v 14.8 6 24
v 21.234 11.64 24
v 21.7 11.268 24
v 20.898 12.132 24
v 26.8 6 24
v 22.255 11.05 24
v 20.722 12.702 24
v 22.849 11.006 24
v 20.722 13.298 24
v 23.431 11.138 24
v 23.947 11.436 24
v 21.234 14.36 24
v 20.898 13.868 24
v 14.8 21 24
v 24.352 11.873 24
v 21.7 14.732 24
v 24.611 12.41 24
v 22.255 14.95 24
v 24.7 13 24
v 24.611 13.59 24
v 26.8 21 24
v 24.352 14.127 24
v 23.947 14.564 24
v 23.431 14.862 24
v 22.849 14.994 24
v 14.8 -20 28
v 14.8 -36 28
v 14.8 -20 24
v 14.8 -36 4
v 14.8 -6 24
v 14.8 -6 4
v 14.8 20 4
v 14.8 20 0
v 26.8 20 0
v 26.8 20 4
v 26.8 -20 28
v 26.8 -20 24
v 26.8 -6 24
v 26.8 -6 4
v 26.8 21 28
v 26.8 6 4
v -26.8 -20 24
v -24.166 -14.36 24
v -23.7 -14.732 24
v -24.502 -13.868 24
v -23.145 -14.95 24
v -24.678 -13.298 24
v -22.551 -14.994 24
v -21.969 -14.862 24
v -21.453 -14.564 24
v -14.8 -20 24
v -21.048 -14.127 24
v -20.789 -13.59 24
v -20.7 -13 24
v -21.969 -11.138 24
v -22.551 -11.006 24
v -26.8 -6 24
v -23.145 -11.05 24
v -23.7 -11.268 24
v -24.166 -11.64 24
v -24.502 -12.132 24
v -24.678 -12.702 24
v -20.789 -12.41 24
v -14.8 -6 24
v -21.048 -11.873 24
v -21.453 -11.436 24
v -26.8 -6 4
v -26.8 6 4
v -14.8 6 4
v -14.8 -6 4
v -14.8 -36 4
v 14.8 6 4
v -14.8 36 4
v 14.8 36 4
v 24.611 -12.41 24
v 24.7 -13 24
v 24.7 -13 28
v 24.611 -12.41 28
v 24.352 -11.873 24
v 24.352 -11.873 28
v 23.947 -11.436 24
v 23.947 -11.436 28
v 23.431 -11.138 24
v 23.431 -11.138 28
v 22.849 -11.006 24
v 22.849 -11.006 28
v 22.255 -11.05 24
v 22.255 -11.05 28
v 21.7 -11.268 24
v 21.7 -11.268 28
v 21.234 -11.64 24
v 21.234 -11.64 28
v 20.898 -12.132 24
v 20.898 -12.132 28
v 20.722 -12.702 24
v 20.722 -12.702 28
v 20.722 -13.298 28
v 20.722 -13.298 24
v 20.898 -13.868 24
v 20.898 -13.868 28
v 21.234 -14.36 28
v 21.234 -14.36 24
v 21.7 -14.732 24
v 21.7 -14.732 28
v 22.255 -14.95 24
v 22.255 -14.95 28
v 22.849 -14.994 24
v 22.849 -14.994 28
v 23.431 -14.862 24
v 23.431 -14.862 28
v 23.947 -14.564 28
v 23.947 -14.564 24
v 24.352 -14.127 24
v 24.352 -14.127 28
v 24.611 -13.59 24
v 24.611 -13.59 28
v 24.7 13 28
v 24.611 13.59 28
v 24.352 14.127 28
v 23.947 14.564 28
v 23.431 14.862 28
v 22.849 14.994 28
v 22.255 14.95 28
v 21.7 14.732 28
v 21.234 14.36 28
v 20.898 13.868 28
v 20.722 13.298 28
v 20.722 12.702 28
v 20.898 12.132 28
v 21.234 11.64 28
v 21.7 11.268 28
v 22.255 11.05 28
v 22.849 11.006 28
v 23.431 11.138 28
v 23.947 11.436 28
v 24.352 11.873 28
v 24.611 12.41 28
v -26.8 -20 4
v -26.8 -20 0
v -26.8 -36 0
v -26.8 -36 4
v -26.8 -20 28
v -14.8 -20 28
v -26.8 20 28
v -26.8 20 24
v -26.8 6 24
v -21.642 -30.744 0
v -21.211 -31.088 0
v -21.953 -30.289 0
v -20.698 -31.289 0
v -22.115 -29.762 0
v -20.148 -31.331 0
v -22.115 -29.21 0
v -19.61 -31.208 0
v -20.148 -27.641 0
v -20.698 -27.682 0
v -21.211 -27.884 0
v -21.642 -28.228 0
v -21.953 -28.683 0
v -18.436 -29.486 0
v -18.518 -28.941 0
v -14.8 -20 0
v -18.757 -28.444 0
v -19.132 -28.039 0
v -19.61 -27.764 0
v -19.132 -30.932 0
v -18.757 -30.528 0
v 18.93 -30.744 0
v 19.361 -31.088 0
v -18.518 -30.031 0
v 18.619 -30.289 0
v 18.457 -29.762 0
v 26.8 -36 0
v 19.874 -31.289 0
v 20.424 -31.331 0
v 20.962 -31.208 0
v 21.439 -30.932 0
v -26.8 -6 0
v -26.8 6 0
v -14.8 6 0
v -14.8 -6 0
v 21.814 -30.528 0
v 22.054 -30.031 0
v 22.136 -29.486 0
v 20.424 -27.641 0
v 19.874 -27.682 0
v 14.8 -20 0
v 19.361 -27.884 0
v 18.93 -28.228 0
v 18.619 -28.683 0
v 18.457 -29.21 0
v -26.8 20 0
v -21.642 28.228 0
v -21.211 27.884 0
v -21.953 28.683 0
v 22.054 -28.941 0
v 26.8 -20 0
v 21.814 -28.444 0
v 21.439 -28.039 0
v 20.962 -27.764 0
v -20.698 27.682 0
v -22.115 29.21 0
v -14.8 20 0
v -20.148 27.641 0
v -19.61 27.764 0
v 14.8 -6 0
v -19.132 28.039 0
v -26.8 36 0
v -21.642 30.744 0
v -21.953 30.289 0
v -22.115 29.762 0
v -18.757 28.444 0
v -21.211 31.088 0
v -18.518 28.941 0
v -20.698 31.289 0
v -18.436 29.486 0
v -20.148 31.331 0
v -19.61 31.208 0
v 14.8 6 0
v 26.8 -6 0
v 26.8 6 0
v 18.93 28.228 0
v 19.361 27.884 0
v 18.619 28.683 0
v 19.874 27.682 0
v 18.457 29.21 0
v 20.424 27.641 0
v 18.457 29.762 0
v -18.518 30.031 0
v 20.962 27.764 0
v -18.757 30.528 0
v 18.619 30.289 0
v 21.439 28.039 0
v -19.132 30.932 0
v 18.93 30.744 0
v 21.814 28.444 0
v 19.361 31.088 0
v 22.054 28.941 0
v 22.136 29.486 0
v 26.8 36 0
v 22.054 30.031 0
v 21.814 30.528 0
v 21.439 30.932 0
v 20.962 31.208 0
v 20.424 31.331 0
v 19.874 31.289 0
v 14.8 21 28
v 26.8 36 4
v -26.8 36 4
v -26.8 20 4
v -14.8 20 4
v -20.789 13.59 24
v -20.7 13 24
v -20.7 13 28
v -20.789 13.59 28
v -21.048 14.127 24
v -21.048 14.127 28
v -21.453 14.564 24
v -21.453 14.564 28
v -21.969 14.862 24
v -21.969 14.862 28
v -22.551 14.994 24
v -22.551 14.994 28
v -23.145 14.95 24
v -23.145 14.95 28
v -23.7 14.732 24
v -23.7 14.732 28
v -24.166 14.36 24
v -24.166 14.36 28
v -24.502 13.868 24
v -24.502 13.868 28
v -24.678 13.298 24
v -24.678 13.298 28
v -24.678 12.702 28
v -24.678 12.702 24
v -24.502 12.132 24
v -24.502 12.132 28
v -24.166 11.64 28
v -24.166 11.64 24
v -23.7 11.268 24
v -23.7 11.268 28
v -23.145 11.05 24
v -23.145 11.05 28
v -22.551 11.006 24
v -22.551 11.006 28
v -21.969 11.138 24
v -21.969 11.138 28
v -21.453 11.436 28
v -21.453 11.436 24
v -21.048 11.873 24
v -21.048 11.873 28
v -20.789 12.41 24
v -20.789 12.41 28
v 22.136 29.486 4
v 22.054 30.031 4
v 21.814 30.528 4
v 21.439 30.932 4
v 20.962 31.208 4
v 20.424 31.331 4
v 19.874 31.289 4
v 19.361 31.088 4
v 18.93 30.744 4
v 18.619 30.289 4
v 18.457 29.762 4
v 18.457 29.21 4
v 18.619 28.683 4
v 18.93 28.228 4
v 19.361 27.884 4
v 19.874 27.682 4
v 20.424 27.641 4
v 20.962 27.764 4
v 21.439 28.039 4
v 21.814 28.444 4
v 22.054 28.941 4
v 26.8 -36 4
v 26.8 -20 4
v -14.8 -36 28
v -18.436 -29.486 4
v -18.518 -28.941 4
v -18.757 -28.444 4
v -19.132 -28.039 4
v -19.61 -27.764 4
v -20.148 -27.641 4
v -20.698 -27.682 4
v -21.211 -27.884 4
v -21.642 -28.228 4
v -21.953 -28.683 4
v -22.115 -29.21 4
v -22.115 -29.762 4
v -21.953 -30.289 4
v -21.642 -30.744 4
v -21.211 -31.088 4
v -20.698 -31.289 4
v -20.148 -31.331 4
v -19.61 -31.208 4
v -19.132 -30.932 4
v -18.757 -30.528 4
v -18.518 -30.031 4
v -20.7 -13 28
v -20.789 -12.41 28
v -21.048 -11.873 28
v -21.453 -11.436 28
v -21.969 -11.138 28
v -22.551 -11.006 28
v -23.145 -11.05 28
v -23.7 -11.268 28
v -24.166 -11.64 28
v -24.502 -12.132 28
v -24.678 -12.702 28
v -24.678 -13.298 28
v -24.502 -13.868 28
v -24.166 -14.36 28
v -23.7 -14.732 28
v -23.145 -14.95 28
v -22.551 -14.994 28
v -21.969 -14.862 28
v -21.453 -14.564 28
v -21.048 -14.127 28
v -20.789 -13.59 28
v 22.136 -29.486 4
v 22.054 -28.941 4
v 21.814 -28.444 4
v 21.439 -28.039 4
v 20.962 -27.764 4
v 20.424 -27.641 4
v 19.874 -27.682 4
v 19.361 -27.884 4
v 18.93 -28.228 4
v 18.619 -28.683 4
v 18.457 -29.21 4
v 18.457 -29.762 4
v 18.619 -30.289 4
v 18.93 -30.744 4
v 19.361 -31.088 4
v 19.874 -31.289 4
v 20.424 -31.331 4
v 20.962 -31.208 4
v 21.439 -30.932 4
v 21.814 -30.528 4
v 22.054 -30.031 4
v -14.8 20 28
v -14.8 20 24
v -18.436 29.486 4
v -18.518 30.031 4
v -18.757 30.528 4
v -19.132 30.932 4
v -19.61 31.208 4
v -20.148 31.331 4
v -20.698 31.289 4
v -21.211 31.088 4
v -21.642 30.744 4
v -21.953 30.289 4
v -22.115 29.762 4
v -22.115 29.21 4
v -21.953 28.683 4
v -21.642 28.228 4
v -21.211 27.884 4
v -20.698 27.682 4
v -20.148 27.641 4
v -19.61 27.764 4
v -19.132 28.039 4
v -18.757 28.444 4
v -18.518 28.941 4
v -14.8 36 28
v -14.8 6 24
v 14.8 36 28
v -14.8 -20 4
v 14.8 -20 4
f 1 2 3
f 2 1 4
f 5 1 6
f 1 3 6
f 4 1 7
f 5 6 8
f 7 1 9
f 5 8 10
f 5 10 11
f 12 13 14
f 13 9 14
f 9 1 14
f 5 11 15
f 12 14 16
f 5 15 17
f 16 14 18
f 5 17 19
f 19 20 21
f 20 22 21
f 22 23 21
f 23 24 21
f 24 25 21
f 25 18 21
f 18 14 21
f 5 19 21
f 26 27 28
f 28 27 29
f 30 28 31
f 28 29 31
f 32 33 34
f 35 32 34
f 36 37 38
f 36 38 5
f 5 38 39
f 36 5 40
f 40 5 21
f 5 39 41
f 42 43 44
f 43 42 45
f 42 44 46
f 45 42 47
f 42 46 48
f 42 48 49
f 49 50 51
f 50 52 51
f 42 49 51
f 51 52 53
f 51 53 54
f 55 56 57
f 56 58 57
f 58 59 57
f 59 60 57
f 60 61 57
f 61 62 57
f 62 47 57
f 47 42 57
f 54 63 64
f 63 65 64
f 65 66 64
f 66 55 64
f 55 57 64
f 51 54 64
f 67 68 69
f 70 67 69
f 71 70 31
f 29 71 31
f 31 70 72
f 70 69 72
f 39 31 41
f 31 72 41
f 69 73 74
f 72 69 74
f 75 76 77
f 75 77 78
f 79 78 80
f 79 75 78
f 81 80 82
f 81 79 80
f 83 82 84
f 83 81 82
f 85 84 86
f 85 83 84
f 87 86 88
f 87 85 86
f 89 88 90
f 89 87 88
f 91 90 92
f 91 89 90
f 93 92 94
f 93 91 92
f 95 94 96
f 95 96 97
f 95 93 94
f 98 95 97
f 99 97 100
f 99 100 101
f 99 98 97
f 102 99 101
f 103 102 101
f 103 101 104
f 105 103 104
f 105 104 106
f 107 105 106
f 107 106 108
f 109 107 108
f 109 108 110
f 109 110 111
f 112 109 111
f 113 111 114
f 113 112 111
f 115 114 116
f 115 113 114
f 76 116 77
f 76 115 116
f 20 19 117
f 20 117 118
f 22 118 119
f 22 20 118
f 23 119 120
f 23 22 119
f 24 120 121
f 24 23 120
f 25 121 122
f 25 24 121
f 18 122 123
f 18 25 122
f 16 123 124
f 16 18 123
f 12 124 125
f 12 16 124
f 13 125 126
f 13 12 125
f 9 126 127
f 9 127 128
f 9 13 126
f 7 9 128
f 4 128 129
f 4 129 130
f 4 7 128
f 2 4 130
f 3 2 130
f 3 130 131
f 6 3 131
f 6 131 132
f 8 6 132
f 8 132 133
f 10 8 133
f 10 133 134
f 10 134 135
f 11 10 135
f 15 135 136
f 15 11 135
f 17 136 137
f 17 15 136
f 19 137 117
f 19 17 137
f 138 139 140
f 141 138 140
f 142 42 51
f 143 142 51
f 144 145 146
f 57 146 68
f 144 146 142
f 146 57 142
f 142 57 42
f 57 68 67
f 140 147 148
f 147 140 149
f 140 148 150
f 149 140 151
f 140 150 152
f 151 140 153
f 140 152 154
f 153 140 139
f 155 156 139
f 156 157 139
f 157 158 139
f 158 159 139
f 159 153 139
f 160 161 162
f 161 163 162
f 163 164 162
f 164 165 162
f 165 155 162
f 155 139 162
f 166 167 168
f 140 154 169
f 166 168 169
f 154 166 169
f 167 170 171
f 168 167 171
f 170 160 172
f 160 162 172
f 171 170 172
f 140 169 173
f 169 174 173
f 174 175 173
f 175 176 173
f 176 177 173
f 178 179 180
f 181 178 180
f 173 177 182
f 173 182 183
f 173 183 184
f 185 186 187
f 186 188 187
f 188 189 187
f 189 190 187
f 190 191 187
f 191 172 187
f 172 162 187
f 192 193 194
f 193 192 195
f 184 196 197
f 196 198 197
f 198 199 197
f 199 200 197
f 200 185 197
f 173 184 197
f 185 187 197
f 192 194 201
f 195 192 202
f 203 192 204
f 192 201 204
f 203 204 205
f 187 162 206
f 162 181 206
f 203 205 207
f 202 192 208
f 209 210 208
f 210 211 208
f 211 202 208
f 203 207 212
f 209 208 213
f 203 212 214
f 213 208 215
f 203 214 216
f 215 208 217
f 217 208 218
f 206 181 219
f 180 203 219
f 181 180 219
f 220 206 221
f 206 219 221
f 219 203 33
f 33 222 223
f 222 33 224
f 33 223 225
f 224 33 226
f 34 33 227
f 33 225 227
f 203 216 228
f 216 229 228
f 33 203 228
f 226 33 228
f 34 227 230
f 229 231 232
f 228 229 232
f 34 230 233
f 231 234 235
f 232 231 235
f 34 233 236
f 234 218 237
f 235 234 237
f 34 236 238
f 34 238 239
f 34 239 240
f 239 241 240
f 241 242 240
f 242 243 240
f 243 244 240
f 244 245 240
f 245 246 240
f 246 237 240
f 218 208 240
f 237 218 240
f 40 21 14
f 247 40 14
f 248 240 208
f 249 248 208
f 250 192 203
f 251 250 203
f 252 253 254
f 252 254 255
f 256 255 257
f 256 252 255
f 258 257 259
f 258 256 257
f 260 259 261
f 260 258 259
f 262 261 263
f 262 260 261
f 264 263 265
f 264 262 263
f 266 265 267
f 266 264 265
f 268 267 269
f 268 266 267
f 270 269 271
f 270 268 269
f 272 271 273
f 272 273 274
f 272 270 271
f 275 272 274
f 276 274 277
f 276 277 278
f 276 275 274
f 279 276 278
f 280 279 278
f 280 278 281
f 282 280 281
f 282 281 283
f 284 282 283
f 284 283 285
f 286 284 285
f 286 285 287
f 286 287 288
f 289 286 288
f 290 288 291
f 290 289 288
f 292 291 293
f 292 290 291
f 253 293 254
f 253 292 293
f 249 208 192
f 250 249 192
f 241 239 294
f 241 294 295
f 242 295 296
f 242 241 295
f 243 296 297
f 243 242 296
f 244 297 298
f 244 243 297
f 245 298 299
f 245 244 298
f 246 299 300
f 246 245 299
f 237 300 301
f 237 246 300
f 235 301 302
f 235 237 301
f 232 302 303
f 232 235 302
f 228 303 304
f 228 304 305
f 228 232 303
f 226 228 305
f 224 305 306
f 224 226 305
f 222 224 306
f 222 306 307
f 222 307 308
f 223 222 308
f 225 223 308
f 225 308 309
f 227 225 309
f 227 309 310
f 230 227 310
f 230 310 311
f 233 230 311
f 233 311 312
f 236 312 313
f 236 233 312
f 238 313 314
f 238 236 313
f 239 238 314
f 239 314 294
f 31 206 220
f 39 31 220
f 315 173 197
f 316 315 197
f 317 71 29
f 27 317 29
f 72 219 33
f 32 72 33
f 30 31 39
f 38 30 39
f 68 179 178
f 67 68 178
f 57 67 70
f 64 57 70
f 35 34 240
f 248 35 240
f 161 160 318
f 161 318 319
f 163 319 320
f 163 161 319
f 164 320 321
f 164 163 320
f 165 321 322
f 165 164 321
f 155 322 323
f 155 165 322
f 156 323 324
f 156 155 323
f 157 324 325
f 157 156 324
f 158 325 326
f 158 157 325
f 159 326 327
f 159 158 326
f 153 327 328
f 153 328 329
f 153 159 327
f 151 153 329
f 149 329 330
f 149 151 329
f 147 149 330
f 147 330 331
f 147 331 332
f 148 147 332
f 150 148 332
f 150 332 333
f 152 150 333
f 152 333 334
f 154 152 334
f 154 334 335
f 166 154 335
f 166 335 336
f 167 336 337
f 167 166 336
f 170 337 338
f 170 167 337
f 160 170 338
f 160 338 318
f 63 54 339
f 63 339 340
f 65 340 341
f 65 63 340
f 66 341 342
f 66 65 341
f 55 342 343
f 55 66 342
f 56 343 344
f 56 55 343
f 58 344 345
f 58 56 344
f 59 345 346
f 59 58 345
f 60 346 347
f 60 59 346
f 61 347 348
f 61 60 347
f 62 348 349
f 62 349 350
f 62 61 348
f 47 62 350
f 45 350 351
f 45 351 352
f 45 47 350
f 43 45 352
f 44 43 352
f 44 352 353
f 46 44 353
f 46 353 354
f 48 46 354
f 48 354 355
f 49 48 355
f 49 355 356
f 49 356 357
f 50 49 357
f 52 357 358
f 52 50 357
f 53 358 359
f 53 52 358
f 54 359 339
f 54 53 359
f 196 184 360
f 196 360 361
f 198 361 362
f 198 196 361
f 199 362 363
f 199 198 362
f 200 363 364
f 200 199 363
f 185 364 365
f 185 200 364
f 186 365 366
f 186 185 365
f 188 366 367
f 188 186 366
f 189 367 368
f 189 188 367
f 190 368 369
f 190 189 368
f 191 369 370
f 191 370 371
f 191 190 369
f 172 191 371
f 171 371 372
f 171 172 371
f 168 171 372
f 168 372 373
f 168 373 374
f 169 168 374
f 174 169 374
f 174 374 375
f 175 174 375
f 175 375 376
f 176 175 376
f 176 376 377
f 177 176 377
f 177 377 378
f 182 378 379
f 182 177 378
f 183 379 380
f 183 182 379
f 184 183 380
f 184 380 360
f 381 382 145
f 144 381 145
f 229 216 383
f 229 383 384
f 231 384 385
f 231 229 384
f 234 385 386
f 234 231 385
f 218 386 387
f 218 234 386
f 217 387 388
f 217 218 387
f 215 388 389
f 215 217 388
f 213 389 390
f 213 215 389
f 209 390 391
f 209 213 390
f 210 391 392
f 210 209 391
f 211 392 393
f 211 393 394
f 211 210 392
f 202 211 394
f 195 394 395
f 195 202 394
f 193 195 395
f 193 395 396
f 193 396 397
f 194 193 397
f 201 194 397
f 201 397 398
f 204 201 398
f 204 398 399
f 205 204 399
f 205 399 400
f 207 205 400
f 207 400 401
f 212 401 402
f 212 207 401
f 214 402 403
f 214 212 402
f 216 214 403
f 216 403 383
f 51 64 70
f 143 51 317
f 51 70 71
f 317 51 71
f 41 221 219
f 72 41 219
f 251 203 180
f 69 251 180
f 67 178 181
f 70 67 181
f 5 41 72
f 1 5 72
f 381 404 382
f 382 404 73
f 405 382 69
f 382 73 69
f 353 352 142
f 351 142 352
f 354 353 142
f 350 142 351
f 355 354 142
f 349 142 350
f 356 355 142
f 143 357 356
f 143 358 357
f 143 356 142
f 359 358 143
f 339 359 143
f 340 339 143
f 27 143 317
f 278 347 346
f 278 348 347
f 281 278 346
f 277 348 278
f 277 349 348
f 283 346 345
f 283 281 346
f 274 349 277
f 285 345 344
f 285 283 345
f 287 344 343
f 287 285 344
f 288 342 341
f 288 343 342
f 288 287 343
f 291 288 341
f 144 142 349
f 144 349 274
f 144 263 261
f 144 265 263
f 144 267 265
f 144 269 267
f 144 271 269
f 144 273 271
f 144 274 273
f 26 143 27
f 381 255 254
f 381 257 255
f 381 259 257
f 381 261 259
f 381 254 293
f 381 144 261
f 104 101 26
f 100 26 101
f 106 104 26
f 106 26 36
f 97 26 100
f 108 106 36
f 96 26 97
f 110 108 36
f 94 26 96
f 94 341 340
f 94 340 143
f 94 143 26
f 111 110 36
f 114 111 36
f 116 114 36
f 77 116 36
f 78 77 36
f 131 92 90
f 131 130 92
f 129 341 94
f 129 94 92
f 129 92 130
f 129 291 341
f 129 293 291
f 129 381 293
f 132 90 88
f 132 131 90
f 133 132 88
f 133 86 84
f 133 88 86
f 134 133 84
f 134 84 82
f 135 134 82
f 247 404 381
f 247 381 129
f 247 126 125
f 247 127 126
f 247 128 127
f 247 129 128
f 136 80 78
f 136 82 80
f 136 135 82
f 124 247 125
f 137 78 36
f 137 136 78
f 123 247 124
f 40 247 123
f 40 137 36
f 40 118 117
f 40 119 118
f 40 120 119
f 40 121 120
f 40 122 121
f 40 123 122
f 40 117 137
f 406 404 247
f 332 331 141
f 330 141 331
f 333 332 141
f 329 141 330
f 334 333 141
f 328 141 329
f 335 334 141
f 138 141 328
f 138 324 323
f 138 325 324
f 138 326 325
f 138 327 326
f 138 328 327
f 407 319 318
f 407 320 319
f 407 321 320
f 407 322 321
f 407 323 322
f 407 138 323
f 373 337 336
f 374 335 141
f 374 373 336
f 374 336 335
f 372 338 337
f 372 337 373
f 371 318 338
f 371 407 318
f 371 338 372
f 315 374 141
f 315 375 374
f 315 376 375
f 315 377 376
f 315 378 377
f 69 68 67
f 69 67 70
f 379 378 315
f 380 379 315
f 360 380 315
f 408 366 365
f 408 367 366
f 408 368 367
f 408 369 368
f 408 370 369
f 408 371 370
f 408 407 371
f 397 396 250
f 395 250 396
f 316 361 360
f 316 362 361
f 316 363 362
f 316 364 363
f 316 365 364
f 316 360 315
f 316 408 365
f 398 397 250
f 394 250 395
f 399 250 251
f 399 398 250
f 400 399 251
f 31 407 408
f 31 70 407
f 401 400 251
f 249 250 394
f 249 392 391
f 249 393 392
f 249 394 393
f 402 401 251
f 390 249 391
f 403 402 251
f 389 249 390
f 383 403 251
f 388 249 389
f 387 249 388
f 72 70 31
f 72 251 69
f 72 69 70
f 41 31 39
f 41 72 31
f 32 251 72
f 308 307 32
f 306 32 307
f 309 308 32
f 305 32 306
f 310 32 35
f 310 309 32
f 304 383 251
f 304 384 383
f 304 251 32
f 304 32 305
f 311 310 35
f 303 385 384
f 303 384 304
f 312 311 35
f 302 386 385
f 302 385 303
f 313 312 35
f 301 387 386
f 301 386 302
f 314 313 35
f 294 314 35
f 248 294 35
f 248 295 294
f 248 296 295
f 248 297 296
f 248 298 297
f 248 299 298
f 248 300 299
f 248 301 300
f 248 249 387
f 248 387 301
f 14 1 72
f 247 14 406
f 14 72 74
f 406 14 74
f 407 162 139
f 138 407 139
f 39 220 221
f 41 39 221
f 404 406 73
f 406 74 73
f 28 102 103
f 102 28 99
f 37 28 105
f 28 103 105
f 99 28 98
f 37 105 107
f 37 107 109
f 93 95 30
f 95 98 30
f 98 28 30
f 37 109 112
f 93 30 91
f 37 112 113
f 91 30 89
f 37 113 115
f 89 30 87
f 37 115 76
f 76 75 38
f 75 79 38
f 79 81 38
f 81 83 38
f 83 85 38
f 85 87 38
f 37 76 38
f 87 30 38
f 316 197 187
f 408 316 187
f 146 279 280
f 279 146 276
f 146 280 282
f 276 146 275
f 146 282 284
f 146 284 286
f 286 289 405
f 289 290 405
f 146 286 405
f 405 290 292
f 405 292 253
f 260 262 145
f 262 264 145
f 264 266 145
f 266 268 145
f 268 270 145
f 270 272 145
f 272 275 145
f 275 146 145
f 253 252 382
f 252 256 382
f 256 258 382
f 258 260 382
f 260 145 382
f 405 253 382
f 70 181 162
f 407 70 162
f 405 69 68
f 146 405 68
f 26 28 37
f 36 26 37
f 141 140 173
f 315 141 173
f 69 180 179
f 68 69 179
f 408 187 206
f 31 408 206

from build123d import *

# Parameters (mm, degrees)
F0_R     = 1.85
F1_DEPTH = 4
F3_DEPTH = 20
F4_R     = 2
F5_DEPTH = 4


with BuildPart() as f1:
    # F0 (on Top) → F1 (new body)
    with BuildSketch(Plane.XY):
        Polygon((26.8, 20), (26.8, 36), (-26.8, 36), (-26.8, 20), (-14.8, 20), (-14.8, 6), (-26.8, 6), (-26.8, -6), (-14.8, -6), (-14.8, -20), (-26.8, -20), (-26.8, -36), (26.8, -36), (26.8, -20), (14.8, -20), (14.8, -6), (26.8, -6), (26.8, 6), (14.8, 6), (14.8, 20), align=None)
        with Locations((-20.28586, -29.48586)):
            Circle(F0_R, mode=Mode.SUBTRACT)
        with Locations((20.28586, -29.48586)):
            Circle(F0_R, mode=Mode.SUBTRACT)
        with Locations((-20.28586, 29.48586)):
            Circle(F0_R, mode=Mode.SUBTRACT)
        with Locations((20.28586, 29.48586)):
            Circle(F0_R, mode=Mode.SUBTRACT)
    extrude(amount=F1_DEPTH)


with BuildPart() as f3:
    # F2 (on face) → F3 (new body)
    with BuildSketch(Plane.XY.offset(4)):
        Polygon((14.8, 20), (14.8, 36), (-14.8, 36), (-14.8, 20), (-14.8, 6), (-26.8, 6), (-26.8, -6), (-14.8, -6), (-14.8, -20), (-14.8, -36), (14.8, -36), (14.8, -20), (14.8, -6), (26.8, -6), (26.8, 6), (14.8, 6), align=None)
    extrude(amount=F3_DEPTH)

    # F4 (on face) → F5 (join)
    with BuildSketch(Plane.XY.offset(24)):
        Polygon((-14.8, -36), (14.8, -36), (14.8, -20), (26.8, -20), (26.8, 21), (14.8, 21), (14.8, 36), (-14.8, 36), (-14.8, 20), (-26.8, 20), (-26.8, -20), (-14.8, -20), align=None)
        with Locations((-22.7, -13)):
            Circle(F4_R, mode=Mode.SUBTRACT)
        with Locations((22.7, -13)):
            Circle(F4_R, mode=Mode.SUBTRACT)
        with Locations((-22.7, 13)):
            Circle(F4_R, mode=Mode.SUBTRACT)
        with Locations((22.7, 13)):
            Circle(F4_R, mode=Mode.SUBTRACT)
    extrude(amount=F5_DEPTH)


solid = Compound([f1.part, f3.part])
